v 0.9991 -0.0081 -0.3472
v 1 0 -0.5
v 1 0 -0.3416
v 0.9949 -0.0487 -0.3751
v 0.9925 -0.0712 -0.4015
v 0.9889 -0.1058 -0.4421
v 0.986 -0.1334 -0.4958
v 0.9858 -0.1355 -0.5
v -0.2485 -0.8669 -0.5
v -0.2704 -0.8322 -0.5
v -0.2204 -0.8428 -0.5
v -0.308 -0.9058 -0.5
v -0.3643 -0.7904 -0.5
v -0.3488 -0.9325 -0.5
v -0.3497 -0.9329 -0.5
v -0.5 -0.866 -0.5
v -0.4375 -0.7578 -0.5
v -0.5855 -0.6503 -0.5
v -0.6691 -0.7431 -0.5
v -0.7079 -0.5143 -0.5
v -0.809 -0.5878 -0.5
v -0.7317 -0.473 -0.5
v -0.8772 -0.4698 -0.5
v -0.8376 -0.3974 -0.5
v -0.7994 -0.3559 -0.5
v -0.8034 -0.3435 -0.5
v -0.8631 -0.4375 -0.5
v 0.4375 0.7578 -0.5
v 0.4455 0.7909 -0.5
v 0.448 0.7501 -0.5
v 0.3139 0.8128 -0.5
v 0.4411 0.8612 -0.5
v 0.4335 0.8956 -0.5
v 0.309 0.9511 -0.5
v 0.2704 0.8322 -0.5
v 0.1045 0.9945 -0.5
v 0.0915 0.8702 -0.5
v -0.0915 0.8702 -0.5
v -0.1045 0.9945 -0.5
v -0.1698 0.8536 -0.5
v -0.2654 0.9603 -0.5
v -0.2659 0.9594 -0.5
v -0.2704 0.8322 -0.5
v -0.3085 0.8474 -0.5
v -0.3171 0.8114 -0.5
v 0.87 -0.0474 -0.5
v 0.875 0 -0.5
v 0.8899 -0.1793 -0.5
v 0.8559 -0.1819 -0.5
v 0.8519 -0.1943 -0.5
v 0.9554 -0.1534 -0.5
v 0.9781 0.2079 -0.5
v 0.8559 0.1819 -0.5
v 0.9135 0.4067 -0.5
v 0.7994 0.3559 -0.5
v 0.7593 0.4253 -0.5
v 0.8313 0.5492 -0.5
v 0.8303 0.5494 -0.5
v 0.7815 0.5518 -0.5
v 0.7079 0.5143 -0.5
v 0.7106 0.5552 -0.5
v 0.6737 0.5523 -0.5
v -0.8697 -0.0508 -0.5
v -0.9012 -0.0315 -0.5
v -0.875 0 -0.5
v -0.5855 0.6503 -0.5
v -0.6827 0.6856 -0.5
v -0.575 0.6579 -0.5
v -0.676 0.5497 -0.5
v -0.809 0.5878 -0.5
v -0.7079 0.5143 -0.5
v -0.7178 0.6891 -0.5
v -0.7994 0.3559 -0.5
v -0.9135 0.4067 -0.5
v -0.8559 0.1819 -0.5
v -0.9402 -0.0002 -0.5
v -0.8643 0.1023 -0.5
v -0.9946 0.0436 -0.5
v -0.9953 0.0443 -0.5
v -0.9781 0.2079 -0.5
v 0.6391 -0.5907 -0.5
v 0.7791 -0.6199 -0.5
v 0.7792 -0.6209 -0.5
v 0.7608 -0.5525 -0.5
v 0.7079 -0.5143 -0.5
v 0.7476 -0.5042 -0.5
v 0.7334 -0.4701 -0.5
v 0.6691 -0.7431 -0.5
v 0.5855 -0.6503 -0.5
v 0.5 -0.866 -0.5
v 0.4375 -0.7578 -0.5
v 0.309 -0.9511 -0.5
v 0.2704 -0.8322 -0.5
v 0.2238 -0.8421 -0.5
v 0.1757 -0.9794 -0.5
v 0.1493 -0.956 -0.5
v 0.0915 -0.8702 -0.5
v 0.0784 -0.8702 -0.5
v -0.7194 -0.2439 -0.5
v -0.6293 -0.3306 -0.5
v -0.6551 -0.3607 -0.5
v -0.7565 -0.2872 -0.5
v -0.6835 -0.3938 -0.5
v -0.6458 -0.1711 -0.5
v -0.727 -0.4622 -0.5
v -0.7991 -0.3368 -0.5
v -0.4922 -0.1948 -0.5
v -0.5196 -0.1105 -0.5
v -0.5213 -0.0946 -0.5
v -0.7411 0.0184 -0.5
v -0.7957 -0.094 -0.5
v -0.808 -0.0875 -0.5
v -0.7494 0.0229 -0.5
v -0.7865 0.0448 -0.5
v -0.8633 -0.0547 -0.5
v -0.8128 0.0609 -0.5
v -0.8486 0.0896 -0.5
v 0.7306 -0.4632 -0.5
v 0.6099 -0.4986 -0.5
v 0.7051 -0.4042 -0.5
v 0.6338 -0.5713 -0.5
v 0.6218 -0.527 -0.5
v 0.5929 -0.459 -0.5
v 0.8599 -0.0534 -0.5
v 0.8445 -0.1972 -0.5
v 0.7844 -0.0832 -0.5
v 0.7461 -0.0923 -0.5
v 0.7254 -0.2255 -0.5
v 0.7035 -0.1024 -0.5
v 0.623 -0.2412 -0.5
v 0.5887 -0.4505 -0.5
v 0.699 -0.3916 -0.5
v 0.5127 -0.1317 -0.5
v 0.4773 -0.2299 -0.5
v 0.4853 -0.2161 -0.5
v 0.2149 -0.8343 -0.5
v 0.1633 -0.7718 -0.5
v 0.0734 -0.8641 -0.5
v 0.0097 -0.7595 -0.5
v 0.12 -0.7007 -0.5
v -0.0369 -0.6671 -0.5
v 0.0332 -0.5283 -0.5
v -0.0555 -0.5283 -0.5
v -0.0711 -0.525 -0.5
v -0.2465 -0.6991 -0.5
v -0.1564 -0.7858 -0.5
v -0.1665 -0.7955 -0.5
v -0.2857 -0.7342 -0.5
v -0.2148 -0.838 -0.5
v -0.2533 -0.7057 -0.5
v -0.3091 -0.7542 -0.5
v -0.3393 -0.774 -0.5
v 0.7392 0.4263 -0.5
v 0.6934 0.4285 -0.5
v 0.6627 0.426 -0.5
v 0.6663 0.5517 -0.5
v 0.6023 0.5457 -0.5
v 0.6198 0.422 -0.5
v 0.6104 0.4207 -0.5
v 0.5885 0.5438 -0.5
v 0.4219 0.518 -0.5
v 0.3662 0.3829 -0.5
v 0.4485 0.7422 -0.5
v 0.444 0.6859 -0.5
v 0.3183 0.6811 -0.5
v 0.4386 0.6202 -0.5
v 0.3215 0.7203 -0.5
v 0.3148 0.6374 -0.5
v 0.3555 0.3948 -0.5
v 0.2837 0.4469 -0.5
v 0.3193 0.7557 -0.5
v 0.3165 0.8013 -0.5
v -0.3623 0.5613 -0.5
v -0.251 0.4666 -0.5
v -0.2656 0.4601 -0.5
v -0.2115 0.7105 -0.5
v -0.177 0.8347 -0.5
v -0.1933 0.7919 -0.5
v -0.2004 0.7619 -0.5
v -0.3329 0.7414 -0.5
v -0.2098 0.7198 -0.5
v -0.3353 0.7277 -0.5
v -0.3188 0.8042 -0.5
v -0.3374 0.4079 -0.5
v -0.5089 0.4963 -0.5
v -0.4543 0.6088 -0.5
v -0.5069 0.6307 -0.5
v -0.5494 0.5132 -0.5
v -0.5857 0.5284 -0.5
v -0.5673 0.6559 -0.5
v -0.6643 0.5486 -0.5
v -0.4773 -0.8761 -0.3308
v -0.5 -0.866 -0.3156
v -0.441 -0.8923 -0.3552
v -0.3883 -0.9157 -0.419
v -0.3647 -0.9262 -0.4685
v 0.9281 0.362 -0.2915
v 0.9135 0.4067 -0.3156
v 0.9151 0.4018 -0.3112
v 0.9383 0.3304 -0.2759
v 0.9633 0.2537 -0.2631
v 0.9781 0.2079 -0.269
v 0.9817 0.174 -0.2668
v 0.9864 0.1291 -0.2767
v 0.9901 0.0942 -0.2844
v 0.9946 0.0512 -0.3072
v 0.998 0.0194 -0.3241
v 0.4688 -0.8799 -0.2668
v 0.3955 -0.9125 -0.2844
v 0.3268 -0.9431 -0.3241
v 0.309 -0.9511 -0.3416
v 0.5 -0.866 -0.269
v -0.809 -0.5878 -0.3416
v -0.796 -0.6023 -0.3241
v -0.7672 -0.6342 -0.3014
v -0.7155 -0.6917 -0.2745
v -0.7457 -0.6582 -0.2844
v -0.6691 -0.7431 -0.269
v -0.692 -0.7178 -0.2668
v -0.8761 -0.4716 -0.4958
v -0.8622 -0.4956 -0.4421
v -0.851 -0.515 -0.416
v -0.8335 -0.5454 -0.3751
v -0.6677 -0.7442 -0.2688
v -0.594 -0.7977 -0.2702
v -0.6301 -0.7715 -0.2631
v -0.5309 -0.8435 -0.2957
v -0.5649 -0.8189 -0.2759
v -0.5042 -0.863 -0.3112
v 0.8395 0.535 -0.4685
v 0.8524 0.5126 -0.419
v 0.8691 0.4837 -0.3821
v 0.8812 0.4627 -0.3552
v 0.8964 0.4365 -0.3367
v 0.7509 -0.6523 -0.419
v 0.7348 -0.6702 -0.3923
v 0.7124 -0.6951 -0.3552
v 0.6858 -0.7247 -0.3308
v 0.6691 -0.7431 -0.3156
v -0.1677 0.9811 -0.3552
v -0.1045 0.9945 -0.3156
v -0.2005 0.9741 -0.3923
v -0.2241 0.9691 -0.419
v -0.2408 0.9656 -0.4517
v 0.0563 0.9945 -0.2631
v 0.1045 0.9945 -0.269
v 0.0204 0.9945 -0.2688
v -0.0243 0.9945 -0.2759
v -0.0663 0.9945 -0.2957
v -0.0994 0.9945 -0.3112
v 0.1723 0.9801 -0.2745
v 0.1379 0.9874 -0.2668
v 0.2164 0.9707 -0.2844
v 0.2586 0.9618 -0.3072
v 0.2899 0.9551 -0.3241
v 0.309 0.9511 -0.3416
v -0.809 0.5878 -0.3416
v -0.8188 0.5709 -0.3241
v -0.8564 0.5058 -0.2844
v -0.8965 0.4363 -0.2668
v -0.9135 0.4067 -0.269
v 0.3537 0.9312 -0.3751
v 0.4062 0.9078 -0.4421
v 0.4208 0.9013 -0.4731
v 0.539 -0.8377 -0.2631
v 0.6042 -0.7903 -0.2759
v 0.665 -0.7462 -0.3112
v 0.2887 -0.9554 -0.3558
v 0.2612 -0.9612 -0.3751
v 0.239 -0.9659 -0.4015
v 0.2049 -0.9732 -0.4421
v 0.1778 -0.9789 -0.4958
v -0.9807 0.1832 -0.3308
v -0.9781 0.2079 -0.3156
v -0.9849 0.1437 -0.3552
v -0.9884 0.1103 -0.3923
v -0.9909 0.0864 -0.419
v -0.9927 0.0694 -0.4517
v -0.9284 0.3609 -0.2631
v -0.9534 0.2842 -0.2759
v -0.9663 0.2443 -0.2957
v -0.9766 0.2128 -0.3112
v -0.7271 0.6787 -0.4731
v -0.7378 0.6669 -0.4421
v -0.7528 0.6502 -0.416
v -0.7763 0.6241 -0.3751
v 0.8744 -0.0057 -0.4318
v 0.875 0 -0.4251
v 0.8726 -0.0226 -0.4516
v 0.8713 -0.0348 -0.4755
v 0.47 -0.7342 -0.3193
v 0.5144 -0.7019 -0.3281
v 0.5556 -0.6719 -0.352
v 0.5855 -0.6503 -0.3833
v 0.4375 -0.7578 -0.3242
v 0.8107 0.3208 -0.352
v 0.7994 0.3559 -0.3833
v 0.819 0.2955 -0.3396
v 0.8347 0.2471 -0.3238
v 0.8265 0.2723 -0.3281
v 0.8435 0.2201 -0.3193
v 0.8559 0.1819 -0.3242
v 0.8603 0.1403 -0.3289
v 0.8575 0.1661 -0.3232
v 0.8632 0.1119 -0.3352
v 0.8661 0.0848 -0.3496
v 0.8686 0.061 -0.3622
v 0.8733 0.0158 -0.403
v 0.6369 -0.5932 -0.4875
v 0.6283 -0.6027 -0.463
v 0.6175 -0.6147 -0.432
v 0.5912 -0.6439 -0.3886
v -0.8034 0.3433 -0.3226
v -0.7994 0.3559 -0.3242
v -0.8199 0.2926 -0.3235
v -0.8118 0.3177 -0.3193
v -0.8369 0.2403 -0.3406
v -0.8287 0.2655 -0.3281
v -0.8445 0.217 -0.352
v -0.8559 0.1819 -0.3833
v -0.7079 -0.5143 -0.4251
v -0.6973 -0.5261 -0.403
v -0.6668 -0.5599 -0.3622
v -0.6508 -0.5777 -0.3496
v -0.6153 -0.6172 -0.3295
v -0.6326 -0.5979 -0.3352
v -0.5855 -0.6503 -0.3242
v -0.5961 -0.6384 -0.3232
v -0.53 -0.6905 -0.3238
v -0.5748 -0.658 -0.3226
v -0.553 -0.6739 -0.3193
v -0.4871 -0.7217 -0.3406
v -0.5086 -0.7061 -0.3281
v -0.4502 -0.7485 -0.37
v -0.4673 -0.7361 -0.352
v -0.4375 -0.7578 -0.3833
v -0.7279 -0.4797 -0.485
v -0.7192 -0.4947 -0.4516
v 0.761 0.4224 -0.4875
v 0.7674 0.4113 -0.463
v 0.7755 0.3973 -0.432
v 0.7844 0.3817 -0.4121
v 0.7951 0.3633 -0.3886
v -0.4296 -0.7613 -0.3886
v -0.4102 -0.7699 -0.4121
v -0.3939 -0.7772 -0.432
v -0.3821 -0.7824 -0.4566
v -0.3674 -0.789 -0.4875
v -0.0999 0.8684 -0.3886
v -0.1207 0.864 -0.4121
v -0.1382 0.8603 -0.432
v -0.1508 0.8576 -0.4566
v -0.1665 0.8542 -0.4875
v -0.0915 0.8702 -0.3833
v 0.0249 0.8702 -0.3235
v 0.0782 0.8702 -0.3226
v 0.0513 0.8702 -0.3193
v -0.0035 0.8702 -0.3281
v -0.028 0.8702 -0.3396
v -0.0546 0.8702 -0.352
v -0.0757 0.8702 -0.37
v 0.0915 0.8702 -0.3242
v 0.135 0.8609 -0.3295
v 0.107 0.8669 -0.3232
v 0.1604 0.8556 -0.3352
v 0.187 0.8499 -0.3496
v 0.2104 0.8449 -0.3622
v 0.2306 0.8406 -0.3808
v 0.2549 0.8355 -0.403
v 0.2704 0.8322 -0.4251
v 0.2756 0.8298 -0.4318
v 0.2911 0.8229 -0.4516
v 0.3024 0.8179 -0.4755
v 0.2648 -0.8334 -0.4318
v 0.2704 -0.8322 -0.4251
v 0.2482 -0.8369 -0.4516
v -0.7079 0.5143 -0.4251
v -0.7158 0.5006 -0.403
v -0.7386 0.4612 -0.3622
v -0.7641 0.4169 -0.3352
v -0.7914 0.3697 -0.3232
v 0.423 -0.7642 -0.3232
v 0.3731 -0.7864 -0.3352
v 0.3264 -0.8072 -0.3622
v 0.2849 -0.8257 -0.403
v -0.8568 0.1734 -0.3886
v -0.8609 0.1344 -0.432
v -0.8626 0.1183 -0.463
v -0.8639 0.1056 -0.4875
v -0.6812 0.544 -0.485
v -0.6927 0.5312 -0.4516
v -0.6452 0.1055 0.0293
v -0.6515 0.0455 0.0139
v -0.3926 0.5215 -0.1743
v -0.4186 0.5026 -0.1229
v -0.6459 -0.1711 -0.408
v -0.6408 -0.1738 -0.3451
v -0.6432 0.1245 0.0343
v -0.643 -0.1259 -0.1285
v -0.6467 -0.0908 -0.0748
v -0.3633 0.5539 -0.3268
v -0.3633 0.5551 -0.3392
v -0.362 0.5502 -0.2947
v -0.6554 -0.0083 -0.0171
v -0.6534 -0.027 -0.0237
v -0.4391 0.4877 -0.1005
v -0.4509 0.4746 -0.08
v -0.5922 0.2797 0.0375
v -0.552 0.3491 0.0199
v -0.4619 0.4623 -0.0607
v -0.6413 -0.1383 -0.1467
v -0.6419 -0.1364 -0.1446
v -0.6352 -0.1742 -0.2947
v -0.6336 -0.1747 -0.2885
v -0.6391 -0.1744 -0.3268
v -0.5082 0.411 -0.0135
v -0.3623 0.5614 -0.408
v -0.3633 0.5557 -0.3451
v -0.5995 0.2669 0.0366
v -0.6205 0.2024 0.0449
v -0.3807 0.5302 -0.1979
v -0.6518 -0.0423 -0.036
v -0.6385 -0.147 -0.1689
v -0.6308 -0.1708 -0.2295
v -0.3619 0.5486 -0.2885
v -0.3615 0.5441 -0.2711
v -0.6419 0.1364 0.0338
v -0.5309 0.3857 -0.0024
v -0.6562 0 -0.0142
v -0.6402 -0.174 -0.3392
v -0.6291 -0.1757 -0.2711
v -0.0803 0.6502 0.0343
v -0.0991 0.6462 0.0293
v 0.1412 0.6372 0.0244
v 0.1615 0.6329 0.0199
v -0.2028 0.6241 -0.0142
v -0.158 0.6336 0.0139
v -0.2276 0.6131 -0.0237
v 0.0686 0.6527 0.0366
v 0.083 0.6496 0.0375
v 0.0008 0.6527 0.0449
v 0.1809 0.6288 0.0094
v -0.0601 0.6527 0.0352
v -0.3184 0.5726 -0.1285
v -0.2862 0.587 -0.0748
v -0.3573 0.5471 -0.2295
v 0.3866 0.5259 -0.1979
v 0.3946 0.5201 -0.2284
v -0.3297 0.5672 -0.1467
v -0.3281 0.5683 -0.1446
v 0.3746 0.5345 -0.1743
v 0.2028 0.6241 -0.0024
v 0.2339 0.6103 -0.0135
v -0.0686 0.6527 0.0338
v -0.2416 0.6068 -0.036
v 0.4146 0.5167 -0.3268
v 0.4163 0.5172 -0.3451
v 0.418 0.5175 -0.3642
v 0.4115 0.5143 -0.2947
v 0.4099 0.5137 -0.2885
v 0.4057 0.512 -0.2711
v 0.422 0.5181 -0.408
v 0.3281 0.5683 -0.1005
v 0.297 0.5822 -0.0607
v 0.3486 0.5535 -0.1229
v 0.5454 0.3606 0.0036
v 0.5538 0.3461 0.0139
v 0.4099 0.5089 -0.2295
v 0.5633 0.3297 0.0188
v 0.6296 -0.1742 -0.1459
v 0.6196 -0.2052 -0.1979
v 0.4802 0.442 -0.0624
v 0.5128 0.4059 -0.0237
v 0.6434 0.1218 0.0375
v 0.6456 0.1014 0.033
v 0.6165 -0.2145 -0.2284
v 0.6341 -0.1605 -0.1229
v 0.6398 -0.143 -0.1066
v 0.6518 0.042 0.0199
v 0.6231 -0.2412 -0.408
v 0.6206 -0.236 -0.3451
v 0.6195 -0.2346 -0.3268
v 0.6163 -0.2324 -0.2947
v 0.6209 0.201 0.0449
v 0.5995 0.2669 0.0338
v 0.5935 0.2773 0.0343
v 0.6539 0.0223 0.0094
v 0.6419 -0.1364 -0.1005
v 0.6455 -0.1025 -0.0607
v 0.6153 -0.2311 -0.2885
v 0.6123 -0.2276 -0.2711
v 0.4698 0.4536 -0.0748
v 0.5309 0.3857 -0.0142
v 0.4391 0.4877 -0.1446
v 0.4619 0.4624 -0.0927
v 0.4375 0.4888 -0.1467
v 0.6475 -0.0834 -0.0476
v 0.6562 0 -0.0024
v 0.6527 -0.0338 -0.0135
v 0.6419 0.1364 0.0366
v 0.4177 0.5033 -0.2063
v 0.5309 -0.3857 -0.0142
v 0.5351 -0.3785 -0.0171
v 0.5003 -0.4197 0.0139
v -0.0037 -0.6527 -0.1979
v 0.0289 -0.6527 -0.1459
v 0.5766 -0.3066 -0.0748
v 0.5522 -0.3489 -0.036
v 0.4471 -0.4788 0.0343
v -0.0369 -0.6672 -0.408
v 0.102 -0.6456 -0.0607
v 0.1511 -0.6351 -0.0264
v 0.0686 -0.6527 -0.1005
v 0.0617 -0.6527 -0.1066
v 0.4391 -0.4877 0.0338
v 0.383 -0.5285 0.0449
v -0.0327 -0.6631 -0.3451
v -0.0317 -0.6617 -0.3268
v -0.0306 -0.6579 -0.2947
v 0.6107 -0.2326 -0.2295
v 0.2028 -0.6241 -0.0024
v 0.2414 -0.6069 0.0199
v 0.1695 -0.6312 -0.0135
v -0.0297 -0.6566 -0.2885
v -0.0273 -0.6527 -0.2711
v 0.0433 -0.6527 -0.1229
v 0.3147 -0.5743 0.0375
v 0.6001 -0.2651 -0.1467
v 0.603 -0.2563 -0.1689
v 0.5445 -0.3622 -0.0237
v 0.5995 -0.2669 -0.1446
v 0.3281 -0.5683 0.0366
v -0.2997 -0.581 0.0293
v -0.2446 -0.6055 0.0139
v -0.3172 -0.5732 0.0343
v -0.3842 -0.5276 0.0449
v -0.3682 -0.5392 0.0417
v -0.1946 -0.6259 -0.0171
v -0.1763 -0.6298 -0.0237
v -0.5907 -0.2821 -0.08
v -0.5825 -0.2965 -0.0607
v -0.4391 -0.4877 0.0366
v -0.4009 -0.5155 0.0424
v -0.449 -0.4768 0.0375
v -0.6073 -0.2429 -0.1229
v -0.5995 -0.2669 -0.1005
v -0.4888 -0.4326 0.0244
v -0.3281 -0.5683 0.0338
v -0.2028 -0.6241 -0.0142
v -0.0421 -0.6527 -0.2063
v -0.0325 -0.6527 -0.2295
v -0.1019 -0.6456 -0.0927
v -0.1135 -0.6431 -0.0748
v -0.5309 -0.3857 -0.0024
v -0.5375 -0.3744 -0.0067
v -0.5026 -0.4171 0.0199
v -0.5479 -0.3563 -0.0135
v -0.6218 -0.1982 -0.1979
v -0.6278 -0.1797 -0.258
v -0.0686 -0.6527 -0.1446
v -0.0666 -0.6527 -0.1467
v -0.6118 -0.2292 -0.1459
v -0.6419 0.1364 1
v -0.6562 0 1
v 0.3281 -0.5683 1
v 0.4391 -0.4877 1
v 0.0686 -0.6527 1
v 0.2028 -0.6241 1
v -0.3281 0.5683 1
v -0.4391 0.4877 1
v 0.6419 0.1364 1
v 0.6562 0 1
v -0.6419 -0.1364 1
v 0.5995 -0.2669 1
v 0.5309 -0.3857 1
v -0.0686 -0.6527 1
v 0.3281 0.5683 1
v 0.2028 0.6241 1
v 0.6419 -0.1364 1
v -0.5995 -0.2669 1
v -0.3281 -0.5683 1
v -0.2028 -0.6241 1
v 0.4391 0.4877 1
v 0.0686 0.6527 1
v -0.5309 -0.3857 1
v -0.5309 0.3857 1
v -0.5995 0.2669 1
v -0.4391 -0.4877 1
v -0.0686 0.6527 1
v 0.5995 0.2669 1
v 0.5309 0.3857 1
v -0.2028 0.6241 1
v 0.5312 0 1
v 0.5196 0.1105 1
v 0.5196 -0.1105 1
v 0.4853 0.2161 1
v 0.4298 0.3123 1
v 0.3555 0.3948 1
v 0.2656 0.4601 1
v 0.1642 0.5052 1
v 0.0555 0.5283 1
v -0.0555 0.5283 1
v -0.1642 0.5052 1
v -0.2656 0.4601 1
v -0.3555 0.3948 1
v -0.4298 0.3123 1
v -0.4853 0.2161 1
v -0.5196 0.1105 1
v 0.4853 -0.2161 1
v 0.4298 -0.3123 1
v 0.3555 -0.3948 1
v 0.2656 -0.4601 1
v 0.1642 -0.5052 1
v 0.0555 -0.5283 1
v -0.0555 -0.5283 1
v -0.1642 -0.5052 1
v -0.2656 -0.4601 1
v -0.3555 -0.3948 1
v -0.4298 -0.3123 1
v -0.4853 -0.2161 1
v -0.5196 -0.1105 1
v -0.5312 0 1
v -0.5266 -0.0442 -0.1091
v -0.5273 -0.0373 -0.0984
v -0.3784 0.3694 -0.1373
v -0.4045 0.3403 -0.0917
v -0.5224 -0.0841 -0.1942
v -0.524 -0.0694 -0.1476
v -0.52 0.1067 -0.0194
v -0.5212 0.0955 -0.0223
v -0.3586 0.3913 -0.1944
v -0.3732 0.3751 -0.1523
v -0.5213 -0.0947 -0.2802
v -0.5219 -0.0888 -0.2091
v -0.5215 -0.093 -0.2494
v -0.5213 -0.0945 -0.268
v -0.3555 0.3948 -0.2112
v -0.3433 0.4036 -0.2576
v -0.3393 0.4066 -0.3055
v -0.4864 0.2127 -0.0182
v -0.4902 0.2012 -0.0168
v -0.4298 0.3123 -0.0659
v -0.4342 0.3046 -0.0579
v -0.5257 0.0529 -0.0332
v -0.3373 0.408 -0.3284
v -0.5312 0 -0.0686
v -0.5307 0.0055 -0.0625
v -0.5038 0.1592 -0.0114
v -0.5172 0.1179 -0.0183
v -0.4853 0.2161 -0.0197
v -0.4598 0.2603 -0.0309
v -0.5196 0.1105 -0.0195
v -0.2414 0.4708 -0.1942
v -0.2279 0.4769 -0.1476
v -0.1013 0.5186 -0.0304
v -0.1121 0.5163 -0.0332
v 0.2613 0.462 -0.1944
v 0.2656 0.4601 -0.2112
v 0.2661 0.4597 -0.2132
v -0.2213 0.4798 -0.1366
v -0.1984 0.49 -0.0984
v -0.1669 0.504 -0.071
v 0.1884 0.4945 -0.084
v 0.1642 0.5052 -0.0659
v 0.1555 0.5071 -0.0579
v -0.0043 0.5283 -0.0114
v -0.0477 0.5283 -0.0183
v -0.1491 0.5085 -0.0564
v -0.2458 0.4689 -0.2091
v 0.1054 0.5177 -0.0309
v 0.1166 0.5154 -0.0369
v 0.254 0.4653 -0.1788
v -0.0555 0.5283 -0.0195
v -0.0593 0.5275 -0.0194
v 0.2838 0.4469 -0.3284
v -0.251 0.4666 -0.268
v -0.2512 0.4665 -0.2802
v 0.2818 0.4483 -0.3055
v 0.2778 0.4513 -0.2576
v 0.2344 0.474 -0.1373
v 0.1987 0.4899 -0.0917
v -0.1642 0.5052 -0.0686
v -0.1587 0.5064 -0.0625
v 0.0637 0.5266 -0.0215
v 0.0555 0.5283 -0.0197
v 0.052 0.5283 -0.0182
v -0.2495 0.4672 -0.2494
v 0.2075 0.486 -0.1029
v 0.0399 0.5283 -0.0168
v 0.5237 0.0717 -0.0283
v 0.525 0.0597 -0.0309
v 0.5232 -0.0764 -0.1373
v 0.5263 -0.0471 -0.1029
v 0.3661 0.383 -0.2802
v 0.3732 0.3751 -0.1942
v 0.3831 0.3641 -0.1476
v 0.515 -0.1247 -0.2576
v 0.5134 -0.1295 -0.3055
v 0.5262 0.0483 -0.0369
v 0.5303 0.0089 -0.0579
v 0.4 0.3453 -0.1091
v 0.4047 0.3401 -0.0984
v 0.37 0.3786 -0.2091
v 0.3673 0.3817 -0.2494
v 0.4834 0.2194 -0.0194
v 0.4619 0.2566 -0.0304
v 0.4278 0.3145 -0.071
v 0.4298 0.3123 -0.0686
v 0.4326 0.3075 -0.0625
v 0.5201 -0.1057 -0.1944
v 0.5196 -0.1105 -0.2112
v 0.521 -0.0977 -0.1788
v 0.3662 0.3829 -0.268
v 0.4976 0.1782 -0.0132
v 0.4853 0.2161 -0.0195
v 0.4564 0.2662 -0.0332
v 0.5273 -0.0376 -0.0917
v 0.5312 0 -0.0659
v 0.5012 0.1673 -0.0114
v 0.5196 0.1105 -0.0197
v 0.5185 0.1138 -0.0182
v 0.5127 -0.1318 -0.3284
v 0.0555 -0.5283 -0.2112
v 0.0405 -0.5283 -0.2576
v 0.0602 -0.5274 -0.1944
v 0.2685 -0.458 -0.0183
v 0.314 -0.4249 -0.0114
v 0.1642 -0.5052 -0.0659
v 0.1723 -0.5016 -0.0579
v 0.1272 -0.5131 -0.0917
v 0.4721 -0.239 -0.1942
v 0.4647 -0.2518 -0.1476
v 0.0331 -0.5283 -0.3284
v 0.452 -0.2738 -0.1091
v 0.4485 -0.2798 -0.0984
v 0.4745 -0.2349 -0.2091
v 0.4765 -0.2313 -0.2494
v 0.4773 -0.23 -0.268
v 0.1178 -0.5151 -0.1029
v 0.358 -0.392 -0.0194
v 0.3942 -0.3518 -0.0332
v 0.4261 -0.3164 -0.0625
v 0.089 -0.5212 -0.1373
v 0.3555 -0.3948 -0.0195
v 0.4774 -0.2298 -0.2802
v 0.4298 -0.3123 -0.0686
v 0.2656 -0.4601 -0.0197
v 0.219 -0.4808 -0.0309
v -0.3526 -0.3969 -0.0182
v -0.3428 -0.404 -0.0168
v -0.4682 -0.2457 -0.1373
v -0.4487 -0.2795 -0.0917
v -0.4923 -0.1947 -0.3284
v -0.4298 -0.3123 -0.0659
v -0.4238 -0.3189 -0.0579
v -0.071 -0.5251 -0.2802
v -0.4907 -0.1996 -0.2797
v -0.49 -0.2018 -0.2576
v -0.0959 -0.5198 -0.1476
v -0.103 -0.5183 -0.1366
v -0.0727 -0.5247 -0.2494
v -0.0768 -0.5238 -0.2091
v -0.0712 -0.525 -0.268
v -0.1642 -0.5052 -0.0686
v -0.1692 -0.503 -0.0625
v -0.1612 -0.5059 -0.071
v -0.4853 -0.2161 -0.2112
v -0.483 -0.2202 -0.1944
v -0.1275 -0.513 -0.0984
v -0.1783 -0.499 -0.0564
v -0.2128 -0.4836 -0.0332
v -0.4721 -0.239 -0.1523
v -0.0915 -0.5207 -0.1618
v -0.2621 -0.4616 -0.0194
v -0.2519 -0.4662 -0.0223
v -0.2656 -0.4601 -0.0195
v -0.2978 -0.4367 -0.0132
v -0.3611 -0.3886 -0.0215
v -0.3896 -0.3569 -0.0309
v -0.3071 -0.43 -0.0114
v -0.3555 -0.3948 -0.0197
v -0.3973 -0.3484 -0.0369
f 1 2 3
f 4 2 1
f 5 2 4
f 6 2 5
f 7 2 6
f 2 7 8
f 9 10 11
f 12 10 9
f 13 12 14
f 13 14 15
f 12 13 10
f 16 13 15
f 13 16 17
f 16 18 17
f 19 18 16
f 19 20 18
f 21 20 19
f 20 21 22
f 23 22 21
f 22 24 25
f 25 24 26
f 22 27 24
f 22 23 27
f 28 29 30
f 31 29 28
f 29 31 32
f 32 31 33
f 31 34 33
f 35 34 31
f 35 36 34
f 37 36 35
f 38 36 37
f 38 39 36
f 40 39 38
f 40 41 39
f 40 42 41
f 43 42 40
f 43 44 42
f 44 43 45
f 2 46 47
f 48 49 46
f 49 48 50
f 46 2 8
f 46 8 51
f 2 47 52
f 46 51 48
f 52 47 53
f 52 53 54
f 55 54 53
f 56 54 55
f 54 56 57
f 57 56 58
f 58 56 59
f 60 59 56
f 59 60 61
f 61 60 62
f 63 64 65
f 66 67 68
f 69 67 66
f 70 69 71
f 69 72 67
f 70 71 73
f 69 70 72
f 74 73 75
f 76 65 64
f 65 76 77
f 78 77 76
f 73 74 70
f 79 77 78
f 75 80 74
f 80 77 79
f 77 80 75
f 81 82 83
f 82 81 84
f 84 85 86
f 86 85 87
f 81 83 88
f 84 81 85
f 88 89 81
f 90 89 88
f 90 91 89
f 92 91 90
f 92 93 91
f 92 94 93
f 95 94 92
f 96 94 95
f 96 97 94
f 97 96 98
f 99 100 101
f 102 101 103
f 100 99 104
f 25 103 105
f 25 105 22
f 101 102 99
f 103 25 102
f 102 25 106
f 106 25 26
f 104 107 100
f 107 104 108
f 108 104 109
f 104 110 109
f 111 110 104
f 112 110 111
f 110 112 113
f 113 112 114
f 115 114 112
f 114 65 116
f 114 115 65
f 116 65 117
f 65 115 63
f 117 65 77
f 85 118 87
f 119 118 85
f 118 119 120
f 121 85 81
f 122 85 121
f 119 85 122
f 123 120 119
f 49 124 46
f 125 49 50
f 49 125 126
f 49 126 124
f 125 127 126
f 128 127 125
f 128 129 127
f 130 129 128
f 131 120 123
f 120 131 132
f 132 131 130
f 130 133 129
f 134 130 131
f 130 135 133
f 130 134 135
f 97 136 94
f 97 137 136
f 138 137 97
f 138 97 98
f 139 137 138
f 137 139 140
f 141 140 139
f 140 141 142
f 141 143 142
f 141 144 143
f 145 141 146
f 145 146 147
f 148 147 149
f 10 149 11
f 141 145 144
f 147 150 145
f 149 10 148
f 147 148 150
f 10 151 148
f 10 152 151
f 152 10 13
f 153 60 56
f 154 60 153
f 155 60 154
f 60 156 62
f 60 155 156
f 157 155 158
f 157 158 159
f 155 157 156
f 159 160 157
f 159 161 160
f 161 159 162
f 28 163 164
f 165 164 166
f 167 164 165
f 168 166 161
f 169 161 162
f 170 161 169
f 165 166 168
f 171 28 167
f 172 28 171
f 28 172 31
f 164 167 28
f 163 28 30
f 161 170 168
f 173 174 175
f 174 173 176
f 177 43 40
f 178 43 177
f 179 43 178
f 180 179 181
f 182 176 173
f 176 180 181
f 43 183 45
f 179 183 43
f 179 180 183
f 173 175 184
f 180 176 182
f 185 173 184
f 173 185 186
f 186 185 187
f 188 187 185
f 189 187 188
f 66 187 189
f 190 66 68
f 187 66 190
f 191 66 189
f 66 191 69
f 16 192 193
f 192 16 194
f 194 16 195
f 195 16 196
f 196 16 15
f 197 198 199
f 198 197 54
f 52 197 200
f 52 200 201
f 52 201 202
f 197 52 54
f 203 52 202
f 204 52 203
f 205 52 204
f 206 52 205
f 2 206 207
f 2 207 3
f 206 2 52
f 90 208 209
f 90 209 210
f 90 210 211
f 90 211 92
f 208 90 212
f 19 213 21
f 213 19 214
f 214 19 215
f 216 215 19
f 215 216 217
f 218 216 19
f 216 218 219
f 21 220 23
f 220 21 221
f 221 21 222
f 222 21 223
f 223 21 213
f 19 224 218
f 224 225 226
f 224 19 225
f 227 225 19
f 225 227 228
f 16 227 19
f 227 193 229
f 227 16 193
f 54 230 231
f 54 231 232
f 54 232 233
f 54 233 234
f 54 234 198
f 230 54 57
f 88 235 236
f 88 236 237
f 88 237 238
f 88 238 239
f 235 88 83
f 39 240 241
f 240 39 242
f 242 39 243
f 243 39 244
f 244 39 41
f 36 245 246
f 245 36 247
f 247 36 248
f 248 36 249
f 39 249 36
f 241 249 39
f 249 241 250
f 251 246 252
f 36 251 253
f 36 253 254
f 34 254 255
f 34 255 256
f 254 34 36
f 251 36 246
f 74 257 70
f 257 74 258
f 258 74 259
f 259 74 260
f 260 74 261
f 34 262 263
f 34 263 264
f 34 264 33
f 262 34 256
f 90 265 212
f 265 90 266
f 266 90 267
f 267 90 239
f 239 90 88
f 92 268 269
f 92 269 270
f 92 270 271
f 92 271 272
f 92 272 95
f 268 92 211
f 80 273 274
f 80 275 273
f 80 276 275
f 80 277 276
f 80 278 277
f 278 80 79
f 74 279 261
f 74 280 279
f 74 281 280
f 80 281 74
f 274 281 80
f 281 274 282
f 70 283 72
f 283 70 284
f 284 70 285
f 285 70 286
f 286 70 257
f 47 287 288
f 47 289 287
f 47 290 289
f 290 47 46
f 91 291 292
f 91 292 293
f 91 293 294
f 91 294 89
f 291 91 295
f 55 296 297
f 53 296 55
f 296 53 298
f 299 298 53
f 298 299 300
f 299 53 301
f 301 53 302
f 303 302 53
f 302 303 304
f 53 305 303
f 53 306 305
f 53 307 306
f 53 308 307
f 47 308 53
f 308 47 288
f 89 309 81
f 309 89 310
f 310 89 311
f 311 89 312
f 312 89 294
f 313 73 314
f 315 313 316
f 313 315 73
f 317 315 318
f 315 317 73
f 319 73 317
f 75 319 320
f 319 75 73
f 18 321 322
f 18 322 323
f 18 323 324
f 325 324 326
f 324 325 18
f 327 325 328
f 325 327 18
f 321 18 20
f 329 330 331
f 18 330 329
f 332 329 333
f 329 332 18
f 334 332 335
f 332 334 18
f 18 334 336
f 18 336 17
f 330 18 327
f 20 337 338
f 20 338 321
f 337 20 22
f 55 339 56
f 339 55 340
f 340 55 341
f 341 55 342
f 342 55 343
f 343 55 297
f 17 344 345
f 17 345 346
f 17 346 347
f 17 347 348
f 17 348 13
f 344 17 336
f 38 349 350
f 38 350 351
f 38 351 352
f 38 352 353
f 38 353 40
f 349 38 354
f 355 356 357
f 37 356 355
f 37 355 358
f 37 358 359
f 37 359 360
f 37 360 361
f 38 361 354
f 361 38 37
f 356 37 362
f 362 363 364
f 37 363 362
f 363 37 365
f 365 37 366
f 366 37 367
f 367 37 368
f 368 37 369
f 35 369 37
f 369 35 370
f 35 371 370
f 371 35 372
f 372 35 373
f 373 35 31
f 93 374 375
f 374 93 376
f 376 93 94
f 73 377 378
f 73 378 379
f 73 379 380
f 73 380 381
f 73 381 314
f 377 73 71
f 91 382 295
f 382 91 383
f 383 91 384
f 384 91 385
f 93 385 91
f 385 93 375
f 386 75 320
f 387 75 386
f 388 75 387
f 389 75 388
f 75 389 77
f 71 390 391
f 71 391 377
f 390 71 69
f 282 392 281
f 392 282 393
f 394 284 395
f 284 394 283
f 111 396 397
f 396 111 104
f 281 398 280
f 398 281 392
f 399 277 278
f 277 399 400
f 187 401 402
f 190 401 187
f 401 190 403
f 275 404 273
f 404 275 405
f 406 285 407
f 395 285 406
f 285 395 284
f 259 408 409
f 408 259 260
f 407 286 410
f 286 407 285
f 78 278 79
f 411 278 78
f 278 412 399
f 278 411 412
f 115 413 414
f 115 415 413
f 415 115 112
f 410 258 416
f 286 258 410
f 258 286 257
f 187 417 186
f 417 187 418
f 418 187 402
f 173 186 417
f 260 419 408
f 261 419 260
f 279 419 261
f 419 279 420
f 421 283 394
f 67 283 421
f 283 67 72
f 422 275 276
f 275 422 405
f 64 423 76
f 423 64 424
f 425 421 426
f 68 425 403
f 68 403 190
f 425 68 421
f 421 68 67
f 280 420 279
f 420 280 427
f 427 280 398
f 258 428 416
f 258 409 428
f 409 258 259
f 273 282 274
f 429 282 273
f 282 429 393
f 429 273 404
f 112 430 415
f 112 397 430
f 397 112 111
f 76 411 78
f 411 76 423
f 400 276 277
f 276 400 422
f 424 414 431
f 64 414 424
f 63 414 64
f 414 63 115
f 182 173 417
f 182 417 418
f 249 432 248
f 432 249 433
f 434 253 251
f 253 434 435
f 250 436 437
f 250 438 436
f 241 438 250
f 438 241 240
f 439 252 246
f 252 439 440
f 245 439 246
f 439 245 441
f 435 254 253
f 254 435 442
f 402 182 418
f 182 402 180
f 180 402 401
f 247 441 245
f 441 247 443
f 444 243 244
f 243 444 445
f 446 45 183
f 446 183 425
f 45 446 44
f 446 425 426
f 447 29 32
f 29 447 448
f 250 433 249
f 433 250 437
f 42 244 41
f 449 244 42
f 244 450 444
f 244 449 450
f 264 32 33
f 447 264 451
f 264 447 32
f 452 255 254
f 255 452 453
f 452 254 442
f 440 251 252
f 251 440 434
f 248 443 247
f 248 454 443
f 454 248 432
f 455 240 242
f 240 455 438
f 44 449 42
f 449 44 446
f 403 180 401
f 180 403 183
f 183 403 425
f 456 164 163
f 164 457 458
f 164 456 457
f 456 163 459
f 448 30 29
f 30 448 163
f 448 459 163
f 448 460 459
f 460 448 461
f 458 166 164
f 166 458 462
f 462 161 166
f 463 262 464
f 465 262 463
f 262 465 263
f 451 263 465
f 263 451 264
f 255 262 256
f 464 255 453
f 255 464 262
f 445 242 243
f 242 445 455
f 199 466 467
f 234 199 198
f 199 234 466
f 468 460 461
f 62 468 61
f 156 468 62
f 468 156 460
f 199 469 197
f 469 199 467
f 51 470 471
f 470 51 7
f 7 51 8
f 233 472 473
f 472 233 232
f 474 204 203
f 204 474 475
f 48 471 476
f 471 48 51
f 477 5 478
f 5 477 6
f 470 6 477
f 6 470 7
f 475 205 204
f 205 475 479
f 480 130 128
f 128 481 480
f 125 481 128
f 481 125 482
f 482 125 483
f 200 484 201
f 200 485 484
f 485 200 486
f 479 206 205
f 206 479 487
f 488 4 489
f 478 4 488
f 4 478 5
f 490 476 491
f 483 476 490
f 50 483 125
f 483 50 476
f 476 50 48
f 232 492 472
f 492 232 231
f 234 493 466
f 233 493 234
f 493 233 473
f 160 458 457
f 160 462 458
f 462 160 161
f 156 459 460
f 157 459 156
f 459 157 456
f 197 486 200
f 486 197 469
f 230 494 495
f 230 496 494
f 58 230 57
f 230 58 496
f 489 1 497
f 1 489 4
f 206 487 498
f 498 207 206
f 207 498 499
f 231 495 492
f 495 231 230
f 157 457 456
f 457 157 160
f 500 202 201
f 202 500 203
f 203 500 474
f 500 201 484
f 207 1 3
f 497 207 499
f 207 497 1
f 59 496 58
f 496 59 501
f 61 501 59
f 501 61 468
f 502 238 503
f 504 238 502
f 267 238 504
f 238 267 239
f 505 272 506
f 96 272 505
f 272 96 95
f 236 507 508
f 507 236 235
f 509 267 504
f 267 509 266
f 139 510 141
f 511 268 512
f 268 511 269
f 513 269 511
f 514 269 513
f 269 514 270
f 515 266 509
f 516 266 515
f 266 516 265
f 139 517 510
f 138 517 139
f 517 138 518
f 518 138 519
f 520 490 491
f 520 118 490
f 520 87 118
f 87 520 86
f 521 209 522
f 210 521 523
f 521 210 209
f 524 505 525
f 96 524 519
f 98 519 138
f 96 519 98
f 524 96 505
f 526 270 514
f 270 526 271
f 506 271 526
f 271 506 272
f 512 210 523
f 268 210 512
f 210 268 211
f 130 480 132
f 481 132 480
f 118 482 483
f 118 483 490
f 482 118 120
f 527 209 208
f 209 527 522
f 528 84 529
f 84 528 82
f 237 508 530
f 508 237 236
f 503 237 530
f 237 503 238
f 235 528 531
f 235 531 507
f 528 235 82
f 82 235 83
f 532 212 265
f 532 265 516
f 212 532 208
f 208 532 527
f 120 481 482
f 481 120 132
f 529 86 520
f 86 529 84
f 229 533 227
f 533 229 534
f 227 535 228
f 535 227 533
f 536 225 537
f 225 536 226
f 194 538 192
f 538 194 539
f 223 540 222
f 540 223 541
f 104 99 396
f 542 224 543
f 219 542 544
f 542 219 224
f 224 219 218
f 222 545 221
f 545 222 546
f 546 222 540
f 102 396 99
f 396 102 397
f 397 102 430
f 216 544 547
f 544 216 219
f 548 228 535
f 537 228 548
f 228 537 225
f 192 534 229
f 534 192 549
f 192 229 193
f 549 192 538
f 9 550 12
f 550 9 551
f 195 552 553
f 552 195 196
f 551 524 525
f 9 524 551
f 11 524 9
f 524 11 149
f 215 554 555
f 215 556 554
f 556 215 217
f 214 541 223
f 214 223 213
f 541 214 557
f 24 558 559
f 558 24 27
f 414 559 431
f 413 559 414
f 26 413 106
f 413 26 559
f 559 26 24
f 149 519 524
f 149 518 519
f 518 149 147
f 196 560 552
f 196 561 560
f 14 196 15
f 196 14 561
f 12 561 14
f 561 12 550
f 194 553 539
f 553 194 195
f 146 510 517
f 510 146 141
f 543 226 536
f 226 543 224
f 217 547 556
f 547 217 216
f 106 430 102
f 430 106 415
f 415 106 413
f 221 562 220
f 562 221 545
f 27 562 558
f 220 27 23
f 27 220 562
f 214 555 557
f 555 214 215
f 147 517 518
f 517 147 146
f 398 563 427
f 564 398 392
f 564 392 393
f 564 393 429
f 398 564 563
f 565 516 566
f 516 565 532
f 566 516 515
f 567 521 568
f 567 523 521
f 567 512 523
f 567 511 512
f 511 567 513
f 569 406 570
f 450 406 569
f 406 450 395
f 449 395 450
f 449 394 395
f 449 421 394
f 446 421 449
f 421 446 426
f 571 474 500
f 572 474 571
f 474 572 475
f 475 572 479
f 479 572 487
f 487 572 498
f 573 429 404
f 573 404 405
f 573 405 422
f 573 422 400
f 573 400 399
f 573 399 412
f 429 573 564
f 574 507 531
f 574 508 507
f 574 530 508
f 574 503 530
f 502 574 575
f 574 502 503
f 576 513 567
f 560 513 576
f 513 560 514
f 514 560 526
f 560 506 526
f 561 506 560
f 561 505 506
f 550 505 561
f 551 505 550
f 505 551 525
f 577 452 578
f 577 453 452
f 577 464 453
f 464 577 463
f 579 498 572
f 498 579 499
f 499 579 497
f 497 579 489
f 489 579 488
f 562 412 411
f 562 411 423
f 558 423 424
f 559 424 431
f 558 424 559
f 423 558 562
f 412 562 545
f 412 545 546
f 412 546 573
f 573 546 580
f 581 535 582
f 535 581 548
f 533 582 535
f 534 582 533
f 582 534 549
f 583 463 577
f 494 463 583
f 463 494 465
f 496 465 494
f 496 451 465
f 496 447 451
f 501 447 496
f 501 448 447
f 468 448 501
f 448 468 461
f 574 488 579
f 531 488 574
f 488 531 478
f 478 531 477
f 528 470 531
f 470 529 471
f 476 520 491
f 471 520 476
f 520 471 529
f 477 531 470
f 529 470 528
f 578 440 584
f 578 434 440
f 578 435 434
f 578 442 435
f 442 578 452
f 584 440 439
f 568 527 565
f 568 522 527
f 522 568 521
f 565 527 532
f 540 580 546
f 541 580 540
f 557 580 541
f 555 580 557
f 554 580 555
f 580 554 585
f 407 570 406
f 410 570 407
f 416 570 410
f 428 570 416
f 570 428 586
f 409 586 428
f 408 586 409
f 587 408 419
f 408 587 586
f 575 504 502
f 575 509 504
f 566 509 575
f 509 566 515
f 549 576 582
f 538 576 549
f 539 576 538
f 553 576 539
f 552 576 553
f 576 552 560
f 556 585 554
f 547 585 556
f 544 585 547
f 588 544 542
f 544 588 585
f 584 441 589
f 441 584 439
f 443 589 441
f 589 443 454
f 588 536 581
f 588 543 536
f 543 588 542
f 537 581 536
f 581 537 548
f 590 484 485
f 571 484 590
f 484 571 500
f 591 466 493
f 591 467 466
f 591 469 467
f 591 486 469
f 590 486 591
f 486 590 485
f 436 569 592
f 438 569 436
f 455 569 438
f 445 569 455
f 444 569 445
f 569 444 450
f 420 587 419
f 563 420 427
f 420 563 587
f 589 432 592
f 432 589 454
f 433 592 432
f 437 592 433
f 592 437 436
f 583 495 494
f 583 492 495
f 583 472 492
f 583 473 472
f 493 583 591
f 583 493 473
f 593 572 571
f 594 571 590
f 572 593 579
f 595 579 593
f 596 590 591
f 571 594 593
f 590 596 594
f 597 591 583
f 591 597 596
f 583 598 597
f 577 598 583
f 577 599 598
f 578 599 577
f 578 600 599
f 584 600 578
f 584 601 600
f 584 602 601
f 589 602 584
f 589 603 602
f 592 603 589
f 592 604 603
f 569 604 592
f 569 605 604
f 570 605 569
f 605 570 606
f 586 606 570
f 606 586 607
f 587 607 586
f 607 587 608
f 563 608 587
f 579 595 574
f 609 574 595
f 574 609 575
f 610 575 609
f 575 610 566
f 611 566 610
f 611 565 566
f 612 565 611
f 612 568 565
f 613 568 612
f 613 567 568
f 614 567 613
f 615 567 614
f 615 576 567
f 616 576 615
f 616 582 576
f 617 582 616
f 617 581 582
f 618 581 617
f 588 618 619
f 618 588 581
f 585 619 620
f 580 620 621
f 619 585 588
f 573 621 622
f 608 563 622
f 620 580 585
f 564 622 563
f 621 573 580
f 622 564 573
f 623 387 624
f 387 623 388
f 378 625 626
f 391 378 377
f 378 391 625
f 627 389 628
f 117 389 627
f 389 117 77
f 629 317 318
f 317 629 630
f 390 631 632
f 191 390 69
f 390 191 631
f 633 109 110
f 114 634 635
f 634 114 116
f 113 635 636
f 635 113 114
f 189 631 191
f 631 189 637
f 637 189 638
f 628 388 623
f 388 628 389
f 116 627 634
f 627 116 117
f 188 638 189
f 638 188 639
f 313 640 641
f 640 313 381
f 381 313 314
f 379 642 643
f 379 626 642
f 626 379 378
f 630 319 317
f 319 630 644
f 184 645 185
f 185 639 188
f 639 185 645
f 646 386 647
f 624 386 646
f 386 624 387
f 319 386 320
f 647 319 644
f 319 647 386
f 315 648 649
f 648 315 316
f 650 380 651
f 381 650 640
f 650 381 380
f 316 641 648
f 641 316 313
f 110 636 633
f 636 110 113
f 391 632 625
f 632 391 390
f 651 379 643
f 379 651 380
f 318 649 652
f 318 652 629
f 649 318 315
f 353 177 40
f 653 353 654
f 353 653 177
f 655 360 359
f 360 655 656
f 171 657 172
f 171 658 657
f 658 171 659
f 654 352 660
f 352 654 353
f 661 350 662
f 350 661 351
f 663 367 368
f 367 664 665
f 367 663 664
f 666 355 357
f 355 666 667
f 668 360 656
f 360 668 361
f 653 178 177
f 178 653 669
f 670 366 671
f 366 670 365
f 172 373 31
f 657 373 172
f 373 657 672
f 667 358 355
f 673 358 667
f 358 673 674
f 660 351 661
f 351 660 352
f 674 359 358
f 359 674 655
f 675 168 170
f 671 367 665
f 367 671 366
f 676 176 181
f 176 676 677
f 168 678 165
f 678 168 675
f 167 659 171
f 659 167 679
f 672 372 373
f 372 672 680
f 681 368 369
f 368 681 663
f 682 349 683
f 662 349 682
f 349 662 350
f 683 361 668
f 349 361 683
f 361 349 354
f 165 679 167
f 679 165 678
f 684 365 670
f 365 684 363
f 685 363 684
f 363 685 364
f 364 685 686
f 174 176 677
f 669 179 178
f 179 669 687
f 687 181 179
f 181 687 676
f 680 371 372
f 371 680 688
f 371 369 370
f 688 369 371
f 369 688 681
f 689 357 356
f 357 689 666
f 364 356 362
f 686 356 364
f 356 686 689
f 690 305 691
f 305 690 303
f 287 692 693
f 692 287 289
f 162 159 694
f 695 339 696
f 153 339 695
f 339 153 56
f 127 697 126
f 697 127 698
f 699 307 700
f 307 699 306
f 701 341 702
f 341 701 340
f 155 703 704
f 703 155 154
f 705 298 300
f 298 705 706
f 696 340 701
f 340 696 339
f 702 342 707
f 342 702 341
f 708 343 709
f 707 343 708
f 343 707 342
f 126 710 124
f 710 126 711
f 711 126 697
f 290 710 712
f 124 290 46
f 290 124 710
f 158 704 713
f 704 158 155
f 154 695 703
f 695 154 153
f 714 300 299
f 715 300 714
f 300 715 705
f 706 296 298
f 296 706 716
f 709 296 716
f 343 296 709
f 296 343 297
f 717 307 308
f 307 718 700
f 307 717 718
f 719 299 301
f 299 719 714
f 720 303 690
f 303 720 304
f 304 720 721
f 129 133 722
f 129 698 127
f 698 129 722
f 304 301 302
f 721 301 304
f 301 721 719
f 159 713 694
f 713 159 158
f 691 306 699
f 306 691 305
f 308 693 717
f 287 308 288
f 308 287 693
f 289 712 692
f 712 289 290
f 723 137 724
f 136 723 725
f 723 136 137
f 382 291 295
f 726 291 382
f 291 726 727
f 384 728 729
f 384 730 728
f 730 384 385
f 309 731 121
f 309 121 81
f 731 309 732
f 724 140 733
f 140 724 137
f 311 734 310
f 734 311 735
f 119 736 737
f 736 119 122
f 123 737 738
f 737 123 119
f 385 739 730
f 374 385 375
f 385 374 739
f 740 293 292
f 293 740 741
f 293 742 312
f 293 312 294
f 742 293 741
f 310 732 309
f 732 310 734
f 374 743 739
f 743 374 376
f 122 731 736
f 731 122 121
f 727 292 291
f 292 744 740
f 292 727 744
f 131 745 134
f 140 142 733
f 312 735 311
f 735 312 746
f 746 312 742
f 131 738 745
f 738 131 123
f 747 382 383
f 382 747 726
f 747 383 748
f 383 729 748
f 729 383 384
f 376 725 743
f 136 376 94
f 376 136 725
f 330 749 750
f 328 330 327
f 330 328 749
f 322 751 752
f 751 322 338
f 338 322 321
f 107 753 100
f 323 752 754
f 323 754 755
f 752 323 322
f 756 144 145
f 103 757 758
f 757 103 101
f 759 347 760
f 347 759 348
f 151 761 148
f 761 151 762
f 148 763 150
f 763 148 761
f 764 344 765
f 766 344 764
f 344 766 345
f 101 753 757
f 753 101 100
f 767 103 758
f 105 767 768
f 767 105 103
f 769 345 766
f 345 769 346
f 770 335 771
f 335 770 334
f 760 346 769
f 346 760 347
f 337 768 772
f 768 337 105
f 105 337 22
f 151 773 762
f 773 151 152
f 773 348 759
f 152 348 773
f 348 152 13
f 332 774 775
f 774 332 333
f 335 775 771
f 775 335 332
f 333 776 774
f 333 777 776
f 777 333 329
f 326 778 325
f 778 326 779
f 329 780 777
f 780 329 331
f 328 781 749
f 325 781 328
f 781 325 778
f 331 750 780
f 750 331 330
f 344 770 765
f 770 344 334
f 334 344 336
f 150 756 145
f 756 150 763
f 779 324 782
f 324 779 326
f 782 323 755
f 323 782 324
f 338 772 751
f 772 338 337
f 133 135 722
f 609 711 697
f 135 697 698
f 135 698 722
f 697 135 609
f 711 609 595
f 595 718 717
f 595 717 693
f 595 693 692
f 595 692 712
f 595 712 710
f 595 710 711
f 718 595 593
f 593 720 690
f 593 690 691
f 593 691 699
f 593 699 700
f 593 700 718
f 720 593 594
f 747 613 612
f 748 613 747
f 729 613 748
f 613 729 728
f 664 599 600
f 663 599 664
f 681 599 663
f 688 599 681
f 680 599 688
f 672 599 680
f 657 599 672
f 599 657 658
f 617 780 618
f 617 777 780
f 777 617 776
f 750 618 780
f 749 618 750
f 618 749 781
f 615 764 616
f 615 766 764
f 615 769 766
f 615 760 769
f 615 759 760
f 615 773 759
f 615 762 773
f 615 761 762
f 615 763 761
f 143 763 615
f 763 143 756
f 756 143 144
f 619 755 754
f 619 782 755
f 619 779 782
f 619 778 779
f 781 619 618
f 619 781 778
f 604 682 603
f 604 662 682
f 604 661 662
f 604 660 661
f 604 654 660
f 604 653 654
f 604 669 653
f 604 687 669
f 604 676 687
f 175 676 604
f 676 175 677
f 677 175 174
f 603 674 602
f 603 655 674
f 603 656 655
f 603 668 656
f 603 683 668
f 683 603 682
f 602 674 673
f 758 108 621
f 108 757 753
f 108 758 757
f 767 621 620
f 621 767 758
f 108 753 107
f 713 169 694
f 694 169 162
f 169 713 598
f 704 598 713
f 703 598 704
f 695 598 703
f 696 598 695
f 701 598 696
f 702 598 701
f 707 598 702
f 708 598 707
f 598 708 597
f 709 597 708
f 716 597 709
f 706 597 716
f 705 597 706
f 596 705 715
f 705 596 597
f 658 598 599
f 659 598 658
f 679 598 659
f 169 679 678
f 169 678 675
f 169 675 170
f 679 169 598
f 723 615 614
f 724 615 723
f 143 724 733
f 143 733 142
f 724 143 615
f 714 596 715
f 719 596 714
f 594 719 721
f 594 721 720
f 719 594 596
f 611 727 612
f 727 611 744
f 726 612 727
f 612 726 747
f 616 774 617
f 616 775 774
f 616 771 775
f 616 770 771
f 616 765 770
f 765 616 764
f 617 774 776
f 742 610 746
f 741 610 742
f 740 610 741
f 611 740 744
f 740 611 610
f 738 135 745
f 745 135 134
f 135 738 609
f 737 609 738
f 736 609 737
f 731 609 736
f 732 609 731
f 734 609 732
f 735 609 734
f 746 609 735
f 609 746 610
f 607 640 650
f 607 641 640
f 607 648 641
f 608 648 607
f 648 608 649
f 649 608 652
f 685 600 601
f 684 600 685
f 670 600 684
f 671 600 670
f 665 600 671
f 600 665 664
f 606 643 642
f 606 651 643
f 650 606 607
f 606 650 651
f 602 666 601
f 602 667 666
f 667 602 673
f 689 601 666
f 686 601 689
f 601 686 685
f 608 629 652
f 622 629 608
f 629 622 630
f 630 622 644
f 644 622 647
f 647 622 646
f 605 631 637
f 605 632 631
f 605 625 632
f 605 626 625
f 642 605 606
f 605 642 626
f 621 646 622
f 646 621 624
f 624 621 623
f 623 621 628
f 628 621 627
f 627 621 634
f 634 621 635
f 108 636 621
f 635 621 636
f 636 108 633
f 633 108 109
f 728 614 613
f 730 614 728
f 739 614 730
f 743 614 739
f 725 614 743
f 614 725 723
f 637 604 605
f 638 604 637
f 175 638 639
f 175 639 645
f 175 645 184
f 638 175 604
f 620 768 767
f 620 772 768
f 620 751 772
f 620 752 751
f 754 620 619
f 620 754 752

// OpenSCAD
/*
This part is to make a tapered funnel top for a bell siphon used in hydroponics/aquaponics.

According to http://affnan-aquaponics.blogspot.com the funnel siphon top helps the siphon start at stop at different water flows better.

Inspiration came from the flower shaped spillway at Kechut Reservoir near Jermuk in Armenia.

I am thinking that the flower shape increases the weir surface which may help prevent problems. That and it looks neat.

Parametric, you can set the number of 'petals' and size it to the pipe you are using for a stand pipe. 

Open scad appears to be unitless, so pick a unit for the parameters and stick to it. Your slicing may assume things are in mm, if so, scale by 2540 to get things in inches.

Created by Mike Creuzer - mike@creuzer.com on 2012-08-15
*/



// Cone parameters
petals = 5; // number of 'petals' in the cone
height = .5;
wallthickness = 1/8;
spiralofsset = -wallthickness;  // Not sure if this helps yet. It needs testing to see if the spiral flow will help with siphon start & stops. Make + or - to control the direction of the spin.
maxwidth = 2;

// Standpipe connection
standpipe = 17/16; // 3/4 ID looks to be about 1 1/16 OD 
depth = 1; // How tall you want the neck to be. A taller neck will allow you to have enough overlap that you can tweak the water height.
connectionthickness = 1/8;

// General settings
smoothness = .01; // 2 is the default & is pretty fast, smaller is smoother down to .01



//Render the part
rotate([180,0,0]) // Flip this over for easier printing
{
	union()
	{
			intersection()
			{
				difference()
				{
					cylinder(h = height, r=.5*maxwidth, $fs = smoothness);
					cylinder(h = height, r=.5*maxwidth -wallthickness, $fs = smoothness);
				}
				flowershell(wallthickness);
			}
			difference()
			{
				flower();
				difference()
				{
						cylinder(h = height, r=maxwidth, $fs = smoothness);
						cylinder(h = height, r=.5*maxwidth, $fs = smoothness);
				}
			}
	}
}




module flower()
{
	difference()
	{
		union() 
		{
			flowershell(wallthickness);
			standconnector();
			translate([0,0,-depth]) standconnector();
		}
		union()
		{
			flowershell();
			translate([0,0,height]) cylinder(h=3*height, r=4*height);
			translate([0,0,-depth]) cylinder(h = depth + height, r=.5*standpipe, $fs = smoothness);
		}
	
	}
}




module flowershell(thickness = 0)
{
		for (i = [0 : petals] ) 
		{
			rotate([0, 0 , i*360/petals]) petal(thickness);
		}

}




module petal(wall = 0)
{
		translate([spiralofsset,0,0])
			hull()
			{
				cylinder(h = height, r1 = .25*standpipe+wall, r2 = .25*standpipe+wall, $fs = smoothness);
				rotate([20,-45,0]) cylinder(h = 3*height, r1 = .25*standpipe+wall, r2 = .25*standpipe+wall, $fs = smoothness);
			}
}



module standconnector()
{
		cylinder(h = depth, r=.5*standpipe + connectionthickness, $fs = smoothness);
}
